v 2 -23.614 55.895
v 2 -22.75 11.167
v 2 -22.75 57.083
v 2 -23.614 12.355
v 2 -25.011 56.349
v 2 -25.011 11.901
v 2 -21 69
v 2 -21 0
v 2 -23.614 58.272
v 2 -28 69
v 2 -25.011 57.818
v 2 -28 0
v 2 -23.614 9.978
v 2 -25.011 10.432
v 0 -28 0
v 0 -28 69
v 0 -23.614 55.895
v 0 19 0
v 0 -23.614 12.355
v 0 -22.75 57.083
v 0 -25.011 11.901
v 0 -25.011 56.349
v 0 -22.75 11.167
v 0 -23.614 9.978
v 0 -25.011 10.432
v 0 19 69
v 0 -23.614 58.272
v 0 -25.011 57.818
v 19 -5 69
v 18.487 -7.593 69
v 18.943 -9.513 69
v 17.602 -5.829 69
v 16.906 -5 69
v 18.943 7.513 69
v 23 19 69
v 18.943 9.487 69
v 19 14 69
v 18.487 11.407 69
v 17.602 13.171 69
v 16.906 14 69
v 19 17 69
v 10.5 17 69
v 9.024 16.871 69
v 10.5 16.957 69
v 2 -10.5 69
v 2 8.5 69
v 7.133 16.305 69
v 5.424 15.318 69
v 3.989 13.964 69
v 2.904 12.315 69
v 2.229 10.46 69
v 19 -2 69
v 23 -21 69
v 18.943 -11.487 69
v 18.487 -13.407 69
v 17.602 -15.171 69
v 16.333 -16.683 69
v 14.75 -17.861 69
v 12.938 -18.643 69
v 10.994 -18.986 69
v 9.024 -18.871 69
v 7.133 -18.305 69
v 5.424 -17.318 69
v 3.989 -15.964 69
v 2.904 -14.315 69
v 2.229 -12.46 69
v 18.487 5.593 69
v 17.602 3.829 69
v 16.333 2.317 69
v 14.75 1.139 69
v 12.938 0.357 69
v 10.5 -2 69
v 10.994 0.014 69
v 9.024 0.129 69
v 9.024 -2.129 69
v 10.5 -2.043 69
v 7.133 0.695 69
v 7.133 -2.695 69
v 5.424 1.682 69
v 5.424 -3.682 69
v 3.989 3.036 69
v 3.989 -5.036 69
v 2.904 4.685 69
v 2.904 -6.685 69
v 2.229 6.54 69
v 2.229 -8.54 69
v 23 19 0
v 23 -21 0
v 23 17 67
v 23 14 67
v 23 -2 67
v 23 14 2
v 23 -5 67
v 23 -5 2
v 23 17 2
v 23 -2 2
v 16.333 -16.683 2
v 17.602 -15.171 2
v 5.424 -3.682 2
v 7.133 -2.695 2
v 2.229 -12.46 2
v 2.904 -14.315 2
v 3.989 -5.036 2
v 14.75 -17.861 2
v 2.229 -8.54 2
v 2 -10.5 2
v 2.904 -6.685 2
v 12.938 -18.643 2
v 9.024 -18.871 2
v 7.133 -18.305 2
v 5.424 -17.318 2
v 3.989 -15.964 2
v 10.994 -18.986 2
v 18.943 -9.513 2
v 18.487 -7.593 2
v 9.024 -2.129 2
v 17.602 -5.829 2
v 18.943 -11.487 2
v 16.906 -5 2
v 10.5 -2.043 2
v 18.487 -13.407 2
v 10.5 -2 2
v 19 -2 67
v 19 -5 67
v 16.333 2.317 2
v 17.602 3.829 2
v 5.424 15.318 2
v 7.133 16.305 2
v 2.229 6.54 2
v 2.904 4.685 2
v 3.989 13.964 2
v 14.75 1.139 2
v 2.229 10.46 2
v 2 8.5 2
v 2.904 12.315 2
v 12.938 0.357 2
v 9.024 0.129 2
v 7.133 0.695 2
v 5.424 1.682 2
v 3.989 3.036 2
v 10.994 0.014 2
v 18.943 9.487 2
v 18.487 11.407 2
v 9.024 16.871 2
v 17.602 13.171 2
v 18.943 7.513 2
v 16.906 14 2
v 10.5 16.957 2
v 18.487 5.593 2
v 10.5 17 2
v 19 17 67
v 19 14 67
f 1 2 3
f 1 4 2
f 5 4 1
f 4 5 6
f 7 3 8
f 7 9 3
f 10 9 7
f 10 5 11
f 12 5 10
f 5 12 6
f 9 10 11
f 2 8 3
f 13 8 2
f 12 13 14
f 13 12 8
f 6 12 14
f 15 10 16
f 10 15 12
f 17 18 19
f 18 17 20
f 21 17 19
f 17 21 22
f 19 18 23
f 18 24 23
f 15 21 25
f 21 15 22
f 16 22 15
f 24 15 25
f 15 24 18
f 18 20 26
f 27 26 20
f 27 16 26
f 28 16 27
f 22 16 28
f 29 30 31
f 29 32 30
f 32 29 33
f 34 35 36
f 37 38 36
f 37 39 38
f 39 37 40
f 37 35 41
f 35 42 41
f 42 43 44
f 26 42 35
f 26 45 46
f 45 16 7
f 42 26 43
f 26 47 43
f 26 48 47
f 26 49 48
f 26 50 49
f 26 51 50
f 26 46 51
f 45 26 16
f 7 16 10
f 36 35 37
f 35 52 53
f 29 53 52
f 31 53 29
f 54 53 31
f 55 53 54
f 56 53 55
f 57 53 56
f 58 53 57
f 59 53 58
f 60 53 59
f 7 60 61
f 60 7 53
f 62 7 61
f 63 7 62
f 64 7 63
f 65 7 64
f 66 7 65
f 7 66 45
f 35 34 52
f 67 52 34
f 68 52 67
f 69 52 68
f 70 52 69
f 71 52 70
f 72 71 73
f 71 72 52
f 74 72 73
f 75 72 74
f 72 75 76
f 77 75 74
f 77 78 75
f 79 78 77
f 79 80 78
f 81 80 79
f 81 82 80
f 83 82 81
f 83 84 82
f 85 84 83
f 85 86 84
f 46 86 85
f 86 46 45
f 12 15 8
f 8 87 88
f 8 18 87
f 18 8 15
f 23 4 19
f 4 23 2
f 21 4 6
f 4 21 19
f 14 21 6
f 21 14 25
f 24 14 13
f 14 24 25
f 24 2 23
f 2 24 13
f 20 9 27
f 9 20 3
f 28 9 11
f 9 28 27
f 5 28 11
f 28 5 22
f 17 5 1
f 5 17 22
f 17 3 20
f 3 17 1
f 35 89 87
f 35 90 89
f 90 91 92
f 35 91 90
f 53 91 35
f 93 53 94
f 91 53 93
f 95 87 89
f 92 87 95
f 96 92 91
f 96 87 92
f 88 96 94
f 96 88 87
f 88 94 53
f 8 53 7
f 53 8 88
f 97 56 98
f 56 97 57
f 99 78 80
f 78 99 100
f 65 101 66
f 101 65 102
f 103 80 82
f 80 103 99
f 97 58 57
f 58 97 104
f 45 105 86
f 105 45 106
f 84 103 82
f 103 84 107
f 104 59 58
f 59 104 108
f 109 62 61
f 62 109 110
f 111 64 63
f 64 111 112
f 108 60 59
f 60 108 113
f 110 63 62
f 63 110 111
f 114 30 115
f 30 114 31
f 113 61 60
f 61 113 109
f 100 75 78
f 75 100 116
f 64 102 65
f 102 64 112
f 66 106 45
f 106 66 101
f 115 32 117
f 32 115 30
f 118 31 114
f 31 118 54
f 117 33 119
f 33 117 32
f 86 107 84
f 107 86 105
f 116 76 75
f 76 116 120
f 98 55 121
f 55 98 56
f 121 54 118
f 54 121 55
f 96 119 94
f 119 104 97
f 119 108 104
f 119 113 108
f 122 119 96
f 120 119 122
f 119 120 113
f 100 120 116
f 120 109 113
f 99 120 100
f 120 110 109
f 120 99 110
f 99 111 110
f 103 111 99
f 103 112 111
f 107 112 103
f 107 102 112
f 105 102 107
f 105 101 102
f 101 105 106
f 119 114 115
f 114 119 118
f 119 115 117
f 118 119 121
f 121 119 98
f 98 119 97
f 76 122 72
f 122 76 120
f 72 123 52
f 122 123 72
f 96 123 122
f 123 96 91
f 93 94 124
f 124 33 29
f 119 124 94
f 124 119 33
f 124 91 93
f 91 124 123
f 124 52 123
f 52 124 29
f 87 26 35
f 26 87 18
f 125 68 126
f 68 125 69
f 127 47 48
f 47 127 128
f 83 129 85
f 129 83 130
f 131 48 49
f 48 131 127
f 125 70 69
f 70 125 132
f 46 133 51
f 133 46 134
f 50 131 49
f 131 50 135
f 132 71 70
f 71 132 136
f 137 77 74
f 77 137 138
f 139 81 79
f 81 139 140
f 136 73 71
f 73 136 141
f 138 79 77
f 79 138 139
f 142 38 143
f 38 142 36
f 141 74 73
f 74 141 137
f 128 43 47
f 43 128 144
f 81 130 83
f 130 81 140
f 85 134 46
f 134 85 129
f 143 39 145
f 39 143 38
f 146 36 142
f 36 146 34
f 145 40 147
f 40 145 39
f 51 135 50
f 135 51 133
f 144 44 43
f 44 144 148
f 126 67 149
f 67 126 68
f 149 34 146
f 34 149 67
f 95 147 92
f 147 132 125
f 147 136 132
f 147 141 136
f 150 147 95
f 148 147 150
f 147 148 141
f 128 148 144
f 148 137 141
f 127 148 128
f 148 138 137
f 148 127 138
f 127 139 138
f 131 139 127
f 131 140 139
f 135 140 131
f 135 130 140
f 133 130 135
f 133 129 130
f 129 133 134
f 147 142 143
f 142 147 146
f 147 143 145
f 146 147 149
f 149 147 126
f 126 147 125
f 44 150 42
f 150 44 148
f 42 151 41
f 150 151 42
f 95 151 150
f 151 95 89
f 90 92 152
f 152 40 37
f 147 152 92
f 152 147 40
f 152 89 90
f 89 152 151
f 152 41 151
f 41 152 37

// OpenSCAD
strip_width=65; //65
storage_diameter=17; //17
component_diameter=3; //3
wall_mounting_thickness=2; //2
length_of_feed=2; //2
length_of_endcap=0;  //0
n=2; //5
wall_mounting=true; //true
module holder()
{
difference()
{
	cube([storage_diameter+wall_mounting_thickness*2+length_of_feed, strip_width+wall_mounting_thickness*2+length_of_endcap, storage_diameter+wall_mounting_thickness*2]);
	translate([wall_mounting_thickness+storage_diameter/2, wall_mounting_thickness, wall_mounting_thickness+storage_diameter/2])
	{
		rotate(a=[90,0,180]){
			cylinder(h=strip_width+length_of_endcap+wall_mounting_thickness+1, r=storage_diameter/2);
		}
	}
	translate([storage_diameter+wall_mounting_thickness*2+length_of_feed,wall_mounting_thickness,component_diameter+wall_mounting_thickness])
	{
		rotate(a=[0,180,0]) {
			cube([length_of_feed+wall_mounting_thickness+storage_diameter/2,strip_width, component_diameter]);
		}
	}
	translate([storage_diameter/2+wall_mounting_thickness,wall_mounting_thickness+strip_width,wall_mounting_thickness])
	{
		rotate(a=[0,0,0]) {
			cube([storage_diameter/2,length_of_endcap+wall_mounting_thickness, component_diameter]);
		}
	}
}
} 

module wall_mounting()
{
difference()
{
	translate([0,0,component_diameter+storage_diameter])
	{
		cube([wall_mounting_thickness, strip_width+wall_mounting_thickness*2+length_of_endcap, 8]);
	}


	translate([-.5,(strip_width+wall_mounting_thickness+length_of_endcap)/6, 4+component_diameter+storage_diameter])
	{
		rotate([0,90,0])
		{
			cylinder(h=wall_mounting_thickness+1, r=2.5/2);
		}
	}
	translate([-.5,((strip_width+wall_mounting_thickness+length_of_endcap)*5/6)+2.5/2, 4+component_diameter+storage_diameter])
	{
		rotate([0,90,0])
		{
			cylinder(h=wall_mounting_thickness+1, r=2.5/2);
		}
	}

}	
}
rotate(a=[90,0,0]){
if (wall_mounting==true)
{
	wall_mounting();
}
for (i=[0:n-1])
{
	translate([0,0,-i*(storage_diameter+wall_mounting_thickness)])
	{
	holder();
	}
}
}
